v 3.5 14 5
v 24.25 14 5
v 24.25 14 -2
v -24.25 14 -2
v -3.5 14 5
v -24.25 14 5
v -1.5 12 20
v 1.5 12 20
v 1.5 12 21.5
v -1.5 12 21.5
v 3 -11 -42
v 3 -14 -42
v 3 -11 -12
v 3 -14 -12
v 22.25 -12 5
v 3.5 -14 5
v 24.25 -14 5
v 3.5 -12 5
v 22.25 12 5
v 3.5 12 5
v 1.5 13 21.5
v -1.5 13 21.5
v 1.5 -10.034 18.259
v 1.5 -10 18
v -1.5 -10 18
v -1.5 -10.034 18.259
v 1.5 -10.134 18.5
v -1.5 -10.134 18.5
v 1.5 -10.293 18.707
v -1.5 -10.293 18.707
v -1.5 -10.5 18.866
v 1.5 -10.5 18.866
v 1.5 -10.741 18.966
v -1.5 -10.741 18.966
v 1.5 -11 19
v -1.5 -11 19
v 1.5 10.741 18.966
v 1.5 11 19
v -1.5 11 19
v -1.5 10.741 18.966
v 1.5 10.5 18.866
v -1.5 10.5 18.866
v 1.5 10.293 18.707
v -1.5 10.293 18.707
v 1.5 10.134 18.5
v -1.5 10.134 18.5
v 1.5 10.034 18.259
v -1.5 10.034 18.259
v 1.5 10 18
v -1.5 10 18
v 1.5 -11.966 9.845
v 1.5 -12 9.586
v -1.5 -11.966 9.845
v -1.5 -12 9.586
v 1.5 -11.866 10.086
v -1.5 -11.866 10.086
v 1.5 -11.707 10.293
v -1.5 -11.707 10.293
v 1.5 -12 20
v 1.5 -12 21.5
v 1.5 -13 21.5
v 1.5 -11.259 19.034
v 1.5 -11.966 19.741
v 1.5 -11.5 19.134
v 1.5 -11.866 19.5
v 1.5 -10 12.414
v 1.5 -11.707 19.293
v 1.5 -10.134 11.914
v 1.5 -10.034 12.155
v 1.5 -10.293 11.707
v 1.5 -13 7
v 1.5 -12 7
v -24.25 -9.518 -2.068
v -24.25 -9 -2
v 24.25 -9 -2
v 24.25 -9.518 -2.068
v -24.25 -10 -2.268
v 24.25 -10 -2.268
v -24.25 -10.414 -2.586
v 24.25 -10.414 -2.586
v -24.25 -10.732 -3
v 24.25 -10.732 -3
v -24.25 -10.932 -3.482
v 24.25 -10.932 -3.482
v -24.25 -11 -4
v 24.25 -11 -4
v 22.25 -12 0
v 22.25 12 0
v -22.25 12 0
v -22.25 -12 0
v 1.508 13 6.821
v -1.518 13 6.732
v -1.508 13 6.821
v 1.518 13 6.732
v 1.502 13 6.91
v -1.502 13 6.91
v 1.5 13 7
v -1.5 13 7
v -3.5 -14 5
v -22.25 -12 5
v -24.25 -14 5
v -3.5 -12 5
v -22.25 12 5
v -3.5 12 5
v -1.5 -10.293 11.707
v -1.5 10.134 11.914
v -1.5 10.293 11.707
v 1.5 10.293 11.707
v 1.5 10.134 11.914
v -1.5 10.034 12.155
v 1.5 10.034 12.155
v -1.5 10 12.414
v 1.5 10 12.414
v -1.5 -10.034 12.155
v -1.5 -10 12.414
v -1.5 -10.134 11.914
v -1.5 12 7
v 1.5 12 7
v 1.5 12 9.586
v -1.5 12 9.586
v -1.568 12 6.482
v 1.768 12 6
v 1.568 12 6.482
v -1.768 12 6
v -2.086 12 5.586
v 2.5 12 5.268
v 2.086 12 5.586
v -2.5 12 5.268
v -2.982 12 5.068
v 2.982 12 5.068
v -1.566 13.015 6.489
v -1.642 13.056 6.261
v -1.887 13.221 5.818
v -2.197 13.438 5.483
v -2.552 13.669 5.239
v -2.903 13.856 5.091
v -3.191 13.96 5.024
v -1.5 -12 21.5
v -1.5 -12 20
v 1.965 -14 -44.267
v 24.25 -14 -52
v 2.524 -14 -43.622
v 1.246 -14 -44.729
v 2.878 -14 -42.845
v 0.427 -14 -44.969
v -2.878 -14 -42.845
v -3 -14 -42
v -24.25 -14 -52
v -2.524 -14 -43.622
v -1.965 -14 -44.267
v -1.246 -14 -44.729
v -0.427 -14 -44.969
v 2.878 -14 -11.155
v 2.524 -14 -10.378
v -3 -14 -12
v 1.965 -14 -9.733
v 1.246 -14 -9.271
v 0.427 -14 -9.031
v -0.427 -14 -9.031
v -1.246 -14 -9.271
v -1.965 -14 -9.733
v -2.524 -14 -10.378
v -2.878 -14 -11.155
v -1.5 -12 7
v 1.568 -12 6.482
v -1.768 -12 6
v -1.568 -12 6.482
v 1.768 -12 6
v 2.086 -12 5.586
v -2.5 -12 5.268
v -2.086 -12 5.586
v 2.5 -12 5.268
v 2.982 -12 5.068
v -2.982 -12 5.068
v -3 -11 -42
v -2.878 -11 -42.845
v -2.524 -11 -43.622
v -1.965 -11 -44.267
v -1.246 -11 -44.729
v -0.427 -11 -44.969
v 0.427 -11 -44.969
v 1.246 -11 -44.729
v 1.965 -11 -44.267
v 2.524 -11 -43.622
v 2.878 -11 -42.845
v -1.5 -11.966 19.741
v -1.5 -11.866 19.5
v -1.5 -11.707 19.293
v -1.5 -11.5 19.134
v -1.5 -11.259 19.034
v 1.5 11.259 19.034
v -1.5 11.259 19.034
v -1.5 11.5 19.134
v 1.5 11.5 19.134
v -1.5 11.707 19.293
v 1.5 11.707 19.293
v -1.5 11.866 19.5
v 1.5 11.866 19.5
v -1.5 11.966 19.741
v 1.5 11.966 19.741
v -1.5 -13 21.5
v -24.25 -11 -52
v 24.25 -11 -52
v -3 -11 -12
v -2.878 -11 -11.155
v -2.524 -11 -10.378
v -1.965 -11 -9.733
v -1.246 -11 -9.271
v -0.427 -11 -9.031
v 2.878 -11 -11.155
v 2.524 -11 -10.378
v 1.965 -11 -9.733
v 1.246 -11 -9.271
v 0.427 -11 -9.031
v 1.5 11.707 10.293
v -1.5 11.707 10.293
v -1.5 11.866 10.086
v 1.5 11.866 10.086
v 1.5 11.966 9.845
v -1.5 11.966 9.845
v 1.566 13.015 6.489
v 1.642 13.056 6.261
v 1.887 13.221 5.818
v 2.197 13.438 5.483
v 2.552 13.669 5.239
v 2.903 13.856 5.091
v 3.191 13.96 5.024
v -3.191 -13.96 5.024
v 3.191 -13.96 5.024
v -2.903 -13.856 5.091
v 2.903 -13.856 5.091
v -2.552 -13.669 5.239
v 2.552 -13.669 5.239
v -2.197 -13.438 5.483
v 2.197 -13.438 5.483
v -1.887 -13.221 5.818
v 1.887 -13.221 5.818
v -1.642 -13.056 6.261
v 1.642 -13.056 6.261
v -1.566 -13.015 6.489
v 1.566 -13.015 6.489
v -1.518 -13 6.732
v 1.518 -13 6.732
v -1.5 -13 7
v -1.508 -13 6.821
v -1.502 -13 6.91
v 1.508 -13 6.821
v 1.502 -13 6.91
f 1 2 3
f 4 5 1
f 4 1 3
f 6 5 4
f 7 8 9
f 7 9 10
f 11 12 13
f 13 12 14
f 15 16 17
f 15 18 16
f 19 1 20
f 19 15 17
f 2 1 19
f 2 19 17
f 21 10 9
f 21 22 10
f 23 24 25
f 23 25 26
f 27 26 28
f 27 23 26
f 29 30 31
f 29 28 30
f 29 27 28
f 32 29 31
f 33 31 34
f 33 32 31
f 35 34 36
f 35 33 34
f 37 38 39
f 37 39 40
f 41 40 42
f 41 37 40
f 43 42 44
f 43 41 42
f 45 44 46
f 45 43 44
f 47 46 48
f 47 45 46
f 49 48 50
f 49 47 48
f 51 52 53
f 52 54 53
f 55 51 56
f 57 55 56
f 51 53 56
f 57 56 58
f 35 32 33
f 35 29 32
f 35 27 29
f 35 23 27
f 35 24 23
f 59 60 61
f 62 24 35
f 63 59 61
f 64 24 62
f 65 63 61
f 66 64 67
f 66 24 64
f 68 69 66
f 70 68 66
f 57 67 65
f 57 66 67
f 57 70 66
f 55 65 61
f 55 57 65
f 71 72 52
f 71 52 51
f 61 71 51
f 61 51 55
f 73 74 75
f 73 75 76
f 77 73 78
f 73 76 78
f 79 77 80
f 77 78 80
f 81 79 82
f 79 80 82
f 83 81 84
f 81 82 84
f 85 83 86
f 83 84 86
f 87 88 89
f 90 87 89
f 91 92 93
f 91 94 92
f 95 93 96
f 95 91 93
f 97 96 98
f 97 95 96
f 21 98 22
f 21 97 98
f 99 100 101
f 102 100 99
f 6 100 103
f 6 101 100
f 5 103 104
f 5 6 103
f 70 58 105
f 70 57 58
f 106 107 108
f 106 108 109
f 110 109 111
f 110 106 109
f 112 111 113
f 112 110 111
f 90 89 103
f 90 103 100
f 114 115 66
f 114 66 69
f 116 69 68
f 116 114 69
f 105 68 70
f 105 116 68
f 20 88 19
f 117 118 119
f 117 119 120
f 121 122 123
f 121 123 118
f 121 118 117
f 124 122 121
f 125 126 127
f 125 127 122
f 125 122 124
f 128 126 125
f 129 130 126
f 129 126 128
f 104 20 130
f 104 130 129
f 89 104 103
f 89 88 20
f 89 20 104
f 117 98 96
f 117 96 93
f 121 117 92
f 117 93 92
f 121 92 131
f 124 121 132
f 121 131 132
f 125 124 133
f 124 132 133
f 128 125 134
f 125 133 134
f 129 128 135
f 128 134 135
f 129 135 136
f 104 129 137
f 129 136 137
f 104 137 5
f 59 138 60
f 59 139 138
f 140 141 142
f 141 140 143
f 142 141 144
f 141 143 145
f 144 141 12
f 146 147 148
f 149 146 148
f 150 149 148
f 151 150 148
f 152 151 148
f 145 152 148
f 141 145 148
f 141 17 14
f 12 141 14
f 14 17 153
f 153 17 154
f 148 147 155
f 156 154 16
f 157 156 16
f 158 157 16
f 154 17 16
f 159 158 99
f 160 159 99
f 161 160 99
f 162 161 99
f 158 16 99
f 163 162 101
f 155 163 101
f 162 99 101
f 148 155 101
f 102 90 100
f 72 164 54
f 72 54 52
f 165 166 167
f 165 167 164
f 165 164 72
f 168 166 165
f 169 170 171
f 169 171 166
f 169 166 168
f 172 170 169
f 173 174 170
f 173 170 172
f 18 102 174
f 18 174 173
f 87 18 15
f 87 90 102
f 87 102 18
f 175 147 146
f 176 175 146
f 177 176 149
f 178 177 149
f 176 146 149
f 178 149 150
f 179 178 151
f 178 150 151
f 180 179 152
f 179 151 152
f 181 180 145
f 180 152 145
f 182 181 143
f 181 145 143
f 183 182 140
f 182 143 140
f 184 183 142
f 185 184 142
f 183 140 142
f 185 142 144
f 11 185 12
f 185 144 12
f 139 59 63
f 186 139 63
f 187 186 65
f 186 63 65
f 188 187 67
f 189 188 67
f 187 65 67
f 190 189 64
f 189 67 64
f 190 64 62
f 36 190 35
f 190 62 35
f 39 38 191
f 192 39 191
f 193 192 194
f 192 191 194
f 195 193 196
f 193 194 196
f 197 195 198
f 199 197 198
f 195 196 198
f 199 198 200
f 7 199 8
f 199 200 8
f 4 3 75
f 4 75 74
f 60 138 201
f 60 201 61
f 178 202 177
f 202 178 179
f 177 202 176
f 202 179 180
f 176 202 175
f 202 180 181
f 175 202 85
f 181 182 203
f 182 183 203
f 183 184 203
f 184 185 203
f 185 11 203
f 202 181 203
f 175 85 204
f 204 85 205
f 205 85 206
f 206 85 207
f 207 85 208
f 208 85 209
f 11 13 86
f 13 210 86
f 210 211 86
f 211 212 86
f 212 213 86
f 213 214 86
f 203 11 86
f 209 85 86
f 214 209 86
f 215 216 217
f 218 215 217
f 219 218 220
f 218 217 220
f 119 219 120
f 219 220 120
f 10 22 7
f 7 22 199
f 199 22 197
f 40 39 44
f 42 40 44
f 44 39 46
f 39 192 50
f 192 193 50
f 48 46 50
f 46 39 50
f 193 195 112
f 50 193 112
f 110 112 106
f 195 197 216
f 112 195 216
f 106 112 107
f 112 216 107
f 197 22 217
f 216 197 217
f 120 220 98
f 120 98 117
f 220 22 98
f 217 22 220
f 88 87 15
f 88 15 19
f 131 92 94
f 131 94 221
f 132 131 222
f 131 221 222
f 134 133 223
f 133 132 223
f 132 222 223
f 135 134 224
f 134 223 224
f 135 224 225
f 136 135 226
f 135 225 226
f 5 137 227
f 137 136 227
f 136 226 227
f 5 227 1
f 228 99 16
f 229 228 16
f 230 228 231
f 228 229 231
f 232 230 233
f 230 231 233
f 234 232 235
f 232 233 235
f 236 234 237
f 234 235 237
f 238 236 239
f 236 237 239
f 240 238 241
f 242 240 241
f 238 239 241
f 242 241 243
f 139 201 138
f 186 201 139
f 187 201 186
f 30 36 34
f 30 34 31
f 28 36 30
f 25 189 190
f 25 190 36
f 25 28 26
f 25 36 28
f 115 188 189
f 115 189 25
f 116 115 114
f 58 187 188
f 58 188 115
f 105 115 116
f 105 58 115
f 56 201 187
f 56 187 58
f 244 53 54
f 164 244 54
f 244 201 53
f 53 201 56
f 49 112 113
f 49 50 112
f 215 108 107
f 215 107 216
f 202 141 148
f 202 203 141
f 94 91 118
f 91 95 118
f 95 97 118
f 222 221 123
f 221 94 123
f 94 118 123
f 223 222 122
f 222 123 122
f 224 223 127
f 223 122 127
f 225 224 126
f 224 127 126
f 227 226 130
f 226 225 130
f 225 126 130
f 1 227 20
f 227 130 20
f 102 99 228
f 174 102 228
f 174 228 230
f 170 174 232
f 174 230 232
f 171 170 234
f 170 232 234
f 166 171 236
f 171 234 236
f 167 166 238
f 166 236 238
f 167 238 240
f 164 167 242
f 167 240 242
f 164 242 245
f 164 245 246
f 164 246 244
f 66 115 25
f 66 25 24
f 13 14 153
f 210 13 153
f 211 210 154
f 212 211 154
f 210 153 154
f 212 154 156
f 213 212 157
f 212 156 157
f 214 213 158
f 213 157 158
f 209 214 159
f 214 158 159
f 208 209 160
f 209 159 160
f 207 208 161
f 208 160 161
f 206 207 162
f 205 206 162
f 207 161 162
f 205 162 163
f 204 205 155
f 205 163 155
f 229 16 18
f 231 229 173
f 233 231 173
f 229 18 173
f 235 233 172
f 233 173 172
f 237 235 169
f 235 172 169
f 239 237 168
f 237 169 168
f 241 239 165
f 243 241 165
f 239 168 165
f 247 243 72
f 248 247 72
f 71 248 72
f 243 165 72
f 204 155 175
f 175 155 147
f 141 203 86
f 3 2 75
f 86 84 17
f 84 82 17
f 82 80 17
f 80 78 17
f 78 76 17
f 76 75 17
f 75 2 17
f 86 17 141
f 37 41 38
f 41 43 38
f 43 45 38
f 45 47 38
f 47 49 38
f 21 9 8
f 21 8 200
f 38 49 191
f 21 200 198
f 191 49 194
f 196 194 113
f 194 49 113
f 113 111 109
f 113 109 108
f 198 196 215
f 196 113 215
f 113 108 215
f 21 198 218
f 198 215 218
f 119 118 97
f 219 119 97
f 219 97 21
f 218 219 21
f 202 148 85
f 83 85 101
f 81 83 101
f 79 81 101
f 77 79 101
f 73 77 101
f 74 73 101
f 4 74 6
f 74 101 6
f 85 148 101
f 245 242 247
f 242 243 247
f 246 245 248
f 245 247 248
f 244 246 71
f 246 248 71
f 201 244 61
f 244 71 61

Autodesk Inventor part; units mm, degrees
ref_plane "YZ Plane" through (0, 0, 0) normal (1, 0, 0) x (0, 1, 0)
ref_plane "XZ Plane" through (0, 0, 0) normal (0, 1, 0) x (-1, 0, 0)
ref_plane "XY Plane" through (0, 0, 0) normal (0, 0, 1) x (1, 0, 0)
sketch "Sketch2" plane through (0, 0, 0) normal (0, 0, 1) x (1, 0, 0)
  line L0 (22.25, 12) -> (-22.25, 12)
  line L1 (-22.25, 12) -> (-22.25, -12)
  line L2 (-22.25, -12) -> (22.25, -12)
  line L3 (22.25, -12) -> (22.25, 12)
  line L4 (22.25, 12) -> (-22.25, -12) construction
  line L5 (-22.25, 12) -> (22.25, -12) construction
  line L6 (24.25, 14) -> (-24.25, 14)
  line L7 (-24.25, 14) -> (-24.25, -14)
  line L8 (-24.25, -14) -> (24.25, -14)
  line L9 (24.25, -14) -> (24.25, 14)
  line L10 (24.25, 14) -> (-24.25, -14) construction
  line L11 (-24.25, 14) -> (24.25, -14) construction
  point P0 (0, 0)
  dimension "d0" = 44.5
  dimension "d1" = 24
  dimension "d2" = 48.5
  dimension "d3" = 28
extrude "Extrusion1" add sketch "Sketch2" along normal blind 5
sketch "Sketch3" plane through (0, 0, 5) normal (0, 0, 1) x (1, 0, 0)
  line L0 (-24.25, 14) -> (-24.25, -14) construction
  line L1 (-24.25, -14) -> (24.25, -14) construction
  line L2 (24.25, -14) -> (24.25, 14) construction
  line L3 (24.25, 14) -> (-24.25, 14) construction
  line L4 (22.25, 12) -> (22.25, -12) construction
  line L5 (22.25, -12) -> (-22.25, -12) construction
  line L6 (-22.25, -12) -> (-22.25, 12) construction
  line L7 (-22.25, 12) -> (22.25, 12) construction
  line L8 (1.5, -13) -> (-1.5, -13)
  line L9 (-1.5, -13) -> (-1.5, -12)
  line L10 (-1.5, -12) -> (1.5, -12)
  line L11 (1.5, -12) -> (1.5, -13)
  line L12 (1.5, -13) -> (-1.5, -12) construction
  line L13 (-1.5, -13) -> (1.5, -12) construction
  line L14 (1.5, 13) -> (-1.5, 13)
  line L15 (-1.5, 13) -> (-1.5, 12)
  line L16 (-1.5, 12) -> (1.5, 12)
  line L17 (1.5, 12) -> (1.5, 13)
  line L18 (1.5, 13) -> (-1.5, 12) construction
  line L19 (-1.5, 13) -> (1.5, 12) construction
  line L20 (0, 19.6) -> (0, -19.6) construction
  point P0 (0, 0)
  point P1 (0, -12.5)
  point P2 (0, -12.5)
  point P3 (0, 12.5)
  point P4 (0, 12.5)
  dimension "d8" = 3
  dimension "d19" = 1
  dimension "d22" = 3
  dimension "d23" = 1
extrude "Extrusion2" add sketch "Sketch3" along normal blind 16.5
sketch "Sketch4" plane through (-22.25, -12, 0) normal (0, 1, 0) x (1, 0, 0)
  line L0 (44.5, 0) -> (0, 0) construction
  line L1 (0, 0) -> (0, -5) construction
  line L2 (20.75, -5) -> (0, -5) construction
  line L3 (20.75, -5) -> (20.75, -21.5) construction
  line L4 (23.75, -21.5) -> (20.75, -21.5) construction
  line L5 (23.75, -5) -> (23.75, -21.5) construction
  line L6 (44.5, -5) -> (23.75, -5) construction
  line L7 (44.5, 0) -> (44.5, -5) construction
  line L8 (20.75, -19) -> (23.75, -19)
  line L9 (23.75, -19) -> (23.75, -10)
  line L10 (23.75, -10) -> (20.75, -10)
  line L11 (20.75, -10) -> (20.75, -19)
  line L12 (20.75, -19) -> (23.75, -10) construction
  line L13 (23.75, -19) -> (20.75, -10) construction
  line L14 (22.25, 4.3) -> (22.25, -25.8) construction
  point P0 (22.25, 0)
  point P1 (22.25, -14.5)
  point P2 (22.25, -14.5)
  dimension "d12" = 10
  dimension "d13" = 9
extrude "Extrusion3" add sketch "Sketch4" along normal blind 2
sketch "Sketch5" plane through (1.5, -14, 5) normal (1, 0, 0) x (0, 0, -1)
  line L0 (0, 2) -> (0, 1) construction
  line L1 (0, 2) -> (-5, 2) construction
  line L2 (-5, 2) -> (-5, 4) construction
  line L3 (-14, 4) -> (-5, 4) construction
  line L4 (-14, 2) -> (-14, 4) construction
  line L5 (-14, 2) -> (-16.5, 2) construction
  line L6 (-16.5, 1) -> (-16.5, 2) construction
  line L7 (0, 1) -> (-16.5, 1) construction
  line L8 (-5, 2) -> (-7, 4)
  line L9 (-5, 2) -> (-5, 4)
  line L10 (-7, 4) -> (-5, 4)
  point P0 (5, 14)
  dimension "d16" = 2
extrude "Extrusion4" cut sketch "Sketch5" against normal up to surface (3 mm away)
sketch "Sketch6" plane through (-22.25, 12, 0) normal (0, -1, 0) x (1, 0, 0)
  line L0 (23.75, 12) -> (20.75, 12) construction
  line L1 (20.75, 10) -> (23.75, 10) construction
  line L2 (23.75, 19) -> (20.75, 19) construction
  line L3 (20.75, 19) -> (23.75, 19)
  line L4 (23.75, 19) -> (23.75, 10)
  line L5 (23.75, 10) -> (20.75, 10)
  line L6 (20.75, 10) -> (20.75, 19)
  point P0 (22.25, 0)
extrude "Extrusion5" add sketch "Sketch6" along normal blind 2
sketch "Sketch8" plane through (1.5, 12, 5) normal (1, 0, 0) x (0, 0, -1)
  line L0 (0, 1) -> (0, 0) construction
  line L1 (0, 1) -> (-16.5, 1) construction
  line L2 (-16.5, 0) -> (-16.5, 1) construction
  line L3 (-14, 0) -> (-16.5, 0) construction
  line L4 (-14, 0) -> (-14, -2) construction
  line L5 (-5, -2) -> (-14, -2) construction
  line L6 (-5, 0) -> (-5, -2) construction
  line L7 (0, 0) -> (-5, 0) construction
  line L8 (-7, -2) -> (-5, 0)
  line L9 (-7, -2) -> (-5, -2)
  line L10 (-5, -2) -> (-5, 0)
  point P0 (5, -12)
  dimension "d26" = 2
extrude "Extrusion6" cut sketch "Sketch8" against normal up to surface (3 mm away)
fillet "Fillet1" radius 2 6 edges at (1.5, -12.5, 5) (0, -13, 5) (-1.5, -12.5, 5) (1.5, 12.5, 5) (0, 13, 5) (-1.5, 12.5, 5)
fillet "Fillet2" radius 1 4 edges at (0, -12, 10) (0, -10, 12) (0, 12, 10) (0, 10, 12)
sketch "Sketch9" plane through (0, 0, 0) normal (0, 0, -1) x (-1, 0, 0)
  line L0 (24.25, 14) -> (24.25, -14) construction
  line L1 (-24.25, 14) -> (24.25, 14) construction
  line L2 (-24.25, -14) -> (-24.25, 14) construction
  line L3 (24.25, -14) -> (-24.25, -14) construction
  line L4 (-22.25, 12) -> (-22.25, -12) construction
  line L5 (22.25, 12) -> (-22.25, 12) construction
  line L6 (22.25, -12) -> (22.25, 12) construction
  line L7 (-22.25, -12) -> (22.25, -12) construction
  line L8 (-24.25, 14) -> (24.25, 14)
  line L9 (24.25, 14) -> (24.25, -14)
  line L10 (24.25, -14) -> (-24.25, -14)
  line L11 (-24.25, -14) -> (-24.25, 14)
  point P0 (0, 0)
extrude "Extrusion7" add sketch "Sketch9" along normal blind 2
fillet "Fillet3" radius 1 2 edges at (0, -12, 19) (0, 12, 19)
fillet "Fillet4" radius 1 2 edges at (0, -10, 19) (0, 10, 19)
sketch "Sketch10" plane through (0, 0, -2) normal (0, 0, -1) x (-1, 0, 0)
  line L0 (-22.25, -12) -> (22.25, -12) construction
  line L1 (-24.25, -14) -> (24.25, -14) construction
  line L2 (24.25, -14) -> (24.25, 14) construction
  line L3 (24.25, 14) -> (-24.25, 14) construction
  line L4 (-24.25, 14) -> (-24.25, -14) construction
  line L5 (-24.25, -14) -> (24.25, -14)
  line L6 (24.25, -14) -> (24.25, -11)
  line L7 (24.25, -11) -> (-24.25, -11)
  line L8 (-24.25, -11) -> (-24.25, -14)
  point P0 (0, 0)
  dimension "d35" = 3
extrude "Extrusion8" add sketch "Sketch10" along normal blind 50
sketch "Sketch11" plane through (3.5, -14, 5) normal (0, -1, 0) x (1, 0, 0)
  line L0 (20.75, -7) -> (-27.75, -7) construction
  line L1 (-3.5, -47) -> (-3.5, -17) construction
  line L2 (-0.5, -47) -> (-0.5, -17)
  line L3 (-6.5, -17) -> (-6.5, -47)
  arc A0 (-6.5, -47) -> (-0.5, -47) centre (-3.5, -47) ccw
  arc A1 (-0.5, -17) -> (-6.5, -17) centre (-3.5, -17) ccw
  line L4 (20.75, -57) -> (-27.75, -57) construction
  line L5 (-3.5, 31.2) -> (-3.5, -71.7) construction
  point P0 (-3.5, -5)
  point P1 (-3.5, -32)
  dimension "d38" = 6
  dimension "d39" = 25
  dimension "d40" = 25
  dimension "d41" = 30
  dimension "d42" = 3
extrude "Extrusion9" cut sketch "Sketch11" against normal blind 10
fillet "Fillet5" radius 2 1 edges at (0, -11, -2)
properties part number "P036_SupportLidar"
